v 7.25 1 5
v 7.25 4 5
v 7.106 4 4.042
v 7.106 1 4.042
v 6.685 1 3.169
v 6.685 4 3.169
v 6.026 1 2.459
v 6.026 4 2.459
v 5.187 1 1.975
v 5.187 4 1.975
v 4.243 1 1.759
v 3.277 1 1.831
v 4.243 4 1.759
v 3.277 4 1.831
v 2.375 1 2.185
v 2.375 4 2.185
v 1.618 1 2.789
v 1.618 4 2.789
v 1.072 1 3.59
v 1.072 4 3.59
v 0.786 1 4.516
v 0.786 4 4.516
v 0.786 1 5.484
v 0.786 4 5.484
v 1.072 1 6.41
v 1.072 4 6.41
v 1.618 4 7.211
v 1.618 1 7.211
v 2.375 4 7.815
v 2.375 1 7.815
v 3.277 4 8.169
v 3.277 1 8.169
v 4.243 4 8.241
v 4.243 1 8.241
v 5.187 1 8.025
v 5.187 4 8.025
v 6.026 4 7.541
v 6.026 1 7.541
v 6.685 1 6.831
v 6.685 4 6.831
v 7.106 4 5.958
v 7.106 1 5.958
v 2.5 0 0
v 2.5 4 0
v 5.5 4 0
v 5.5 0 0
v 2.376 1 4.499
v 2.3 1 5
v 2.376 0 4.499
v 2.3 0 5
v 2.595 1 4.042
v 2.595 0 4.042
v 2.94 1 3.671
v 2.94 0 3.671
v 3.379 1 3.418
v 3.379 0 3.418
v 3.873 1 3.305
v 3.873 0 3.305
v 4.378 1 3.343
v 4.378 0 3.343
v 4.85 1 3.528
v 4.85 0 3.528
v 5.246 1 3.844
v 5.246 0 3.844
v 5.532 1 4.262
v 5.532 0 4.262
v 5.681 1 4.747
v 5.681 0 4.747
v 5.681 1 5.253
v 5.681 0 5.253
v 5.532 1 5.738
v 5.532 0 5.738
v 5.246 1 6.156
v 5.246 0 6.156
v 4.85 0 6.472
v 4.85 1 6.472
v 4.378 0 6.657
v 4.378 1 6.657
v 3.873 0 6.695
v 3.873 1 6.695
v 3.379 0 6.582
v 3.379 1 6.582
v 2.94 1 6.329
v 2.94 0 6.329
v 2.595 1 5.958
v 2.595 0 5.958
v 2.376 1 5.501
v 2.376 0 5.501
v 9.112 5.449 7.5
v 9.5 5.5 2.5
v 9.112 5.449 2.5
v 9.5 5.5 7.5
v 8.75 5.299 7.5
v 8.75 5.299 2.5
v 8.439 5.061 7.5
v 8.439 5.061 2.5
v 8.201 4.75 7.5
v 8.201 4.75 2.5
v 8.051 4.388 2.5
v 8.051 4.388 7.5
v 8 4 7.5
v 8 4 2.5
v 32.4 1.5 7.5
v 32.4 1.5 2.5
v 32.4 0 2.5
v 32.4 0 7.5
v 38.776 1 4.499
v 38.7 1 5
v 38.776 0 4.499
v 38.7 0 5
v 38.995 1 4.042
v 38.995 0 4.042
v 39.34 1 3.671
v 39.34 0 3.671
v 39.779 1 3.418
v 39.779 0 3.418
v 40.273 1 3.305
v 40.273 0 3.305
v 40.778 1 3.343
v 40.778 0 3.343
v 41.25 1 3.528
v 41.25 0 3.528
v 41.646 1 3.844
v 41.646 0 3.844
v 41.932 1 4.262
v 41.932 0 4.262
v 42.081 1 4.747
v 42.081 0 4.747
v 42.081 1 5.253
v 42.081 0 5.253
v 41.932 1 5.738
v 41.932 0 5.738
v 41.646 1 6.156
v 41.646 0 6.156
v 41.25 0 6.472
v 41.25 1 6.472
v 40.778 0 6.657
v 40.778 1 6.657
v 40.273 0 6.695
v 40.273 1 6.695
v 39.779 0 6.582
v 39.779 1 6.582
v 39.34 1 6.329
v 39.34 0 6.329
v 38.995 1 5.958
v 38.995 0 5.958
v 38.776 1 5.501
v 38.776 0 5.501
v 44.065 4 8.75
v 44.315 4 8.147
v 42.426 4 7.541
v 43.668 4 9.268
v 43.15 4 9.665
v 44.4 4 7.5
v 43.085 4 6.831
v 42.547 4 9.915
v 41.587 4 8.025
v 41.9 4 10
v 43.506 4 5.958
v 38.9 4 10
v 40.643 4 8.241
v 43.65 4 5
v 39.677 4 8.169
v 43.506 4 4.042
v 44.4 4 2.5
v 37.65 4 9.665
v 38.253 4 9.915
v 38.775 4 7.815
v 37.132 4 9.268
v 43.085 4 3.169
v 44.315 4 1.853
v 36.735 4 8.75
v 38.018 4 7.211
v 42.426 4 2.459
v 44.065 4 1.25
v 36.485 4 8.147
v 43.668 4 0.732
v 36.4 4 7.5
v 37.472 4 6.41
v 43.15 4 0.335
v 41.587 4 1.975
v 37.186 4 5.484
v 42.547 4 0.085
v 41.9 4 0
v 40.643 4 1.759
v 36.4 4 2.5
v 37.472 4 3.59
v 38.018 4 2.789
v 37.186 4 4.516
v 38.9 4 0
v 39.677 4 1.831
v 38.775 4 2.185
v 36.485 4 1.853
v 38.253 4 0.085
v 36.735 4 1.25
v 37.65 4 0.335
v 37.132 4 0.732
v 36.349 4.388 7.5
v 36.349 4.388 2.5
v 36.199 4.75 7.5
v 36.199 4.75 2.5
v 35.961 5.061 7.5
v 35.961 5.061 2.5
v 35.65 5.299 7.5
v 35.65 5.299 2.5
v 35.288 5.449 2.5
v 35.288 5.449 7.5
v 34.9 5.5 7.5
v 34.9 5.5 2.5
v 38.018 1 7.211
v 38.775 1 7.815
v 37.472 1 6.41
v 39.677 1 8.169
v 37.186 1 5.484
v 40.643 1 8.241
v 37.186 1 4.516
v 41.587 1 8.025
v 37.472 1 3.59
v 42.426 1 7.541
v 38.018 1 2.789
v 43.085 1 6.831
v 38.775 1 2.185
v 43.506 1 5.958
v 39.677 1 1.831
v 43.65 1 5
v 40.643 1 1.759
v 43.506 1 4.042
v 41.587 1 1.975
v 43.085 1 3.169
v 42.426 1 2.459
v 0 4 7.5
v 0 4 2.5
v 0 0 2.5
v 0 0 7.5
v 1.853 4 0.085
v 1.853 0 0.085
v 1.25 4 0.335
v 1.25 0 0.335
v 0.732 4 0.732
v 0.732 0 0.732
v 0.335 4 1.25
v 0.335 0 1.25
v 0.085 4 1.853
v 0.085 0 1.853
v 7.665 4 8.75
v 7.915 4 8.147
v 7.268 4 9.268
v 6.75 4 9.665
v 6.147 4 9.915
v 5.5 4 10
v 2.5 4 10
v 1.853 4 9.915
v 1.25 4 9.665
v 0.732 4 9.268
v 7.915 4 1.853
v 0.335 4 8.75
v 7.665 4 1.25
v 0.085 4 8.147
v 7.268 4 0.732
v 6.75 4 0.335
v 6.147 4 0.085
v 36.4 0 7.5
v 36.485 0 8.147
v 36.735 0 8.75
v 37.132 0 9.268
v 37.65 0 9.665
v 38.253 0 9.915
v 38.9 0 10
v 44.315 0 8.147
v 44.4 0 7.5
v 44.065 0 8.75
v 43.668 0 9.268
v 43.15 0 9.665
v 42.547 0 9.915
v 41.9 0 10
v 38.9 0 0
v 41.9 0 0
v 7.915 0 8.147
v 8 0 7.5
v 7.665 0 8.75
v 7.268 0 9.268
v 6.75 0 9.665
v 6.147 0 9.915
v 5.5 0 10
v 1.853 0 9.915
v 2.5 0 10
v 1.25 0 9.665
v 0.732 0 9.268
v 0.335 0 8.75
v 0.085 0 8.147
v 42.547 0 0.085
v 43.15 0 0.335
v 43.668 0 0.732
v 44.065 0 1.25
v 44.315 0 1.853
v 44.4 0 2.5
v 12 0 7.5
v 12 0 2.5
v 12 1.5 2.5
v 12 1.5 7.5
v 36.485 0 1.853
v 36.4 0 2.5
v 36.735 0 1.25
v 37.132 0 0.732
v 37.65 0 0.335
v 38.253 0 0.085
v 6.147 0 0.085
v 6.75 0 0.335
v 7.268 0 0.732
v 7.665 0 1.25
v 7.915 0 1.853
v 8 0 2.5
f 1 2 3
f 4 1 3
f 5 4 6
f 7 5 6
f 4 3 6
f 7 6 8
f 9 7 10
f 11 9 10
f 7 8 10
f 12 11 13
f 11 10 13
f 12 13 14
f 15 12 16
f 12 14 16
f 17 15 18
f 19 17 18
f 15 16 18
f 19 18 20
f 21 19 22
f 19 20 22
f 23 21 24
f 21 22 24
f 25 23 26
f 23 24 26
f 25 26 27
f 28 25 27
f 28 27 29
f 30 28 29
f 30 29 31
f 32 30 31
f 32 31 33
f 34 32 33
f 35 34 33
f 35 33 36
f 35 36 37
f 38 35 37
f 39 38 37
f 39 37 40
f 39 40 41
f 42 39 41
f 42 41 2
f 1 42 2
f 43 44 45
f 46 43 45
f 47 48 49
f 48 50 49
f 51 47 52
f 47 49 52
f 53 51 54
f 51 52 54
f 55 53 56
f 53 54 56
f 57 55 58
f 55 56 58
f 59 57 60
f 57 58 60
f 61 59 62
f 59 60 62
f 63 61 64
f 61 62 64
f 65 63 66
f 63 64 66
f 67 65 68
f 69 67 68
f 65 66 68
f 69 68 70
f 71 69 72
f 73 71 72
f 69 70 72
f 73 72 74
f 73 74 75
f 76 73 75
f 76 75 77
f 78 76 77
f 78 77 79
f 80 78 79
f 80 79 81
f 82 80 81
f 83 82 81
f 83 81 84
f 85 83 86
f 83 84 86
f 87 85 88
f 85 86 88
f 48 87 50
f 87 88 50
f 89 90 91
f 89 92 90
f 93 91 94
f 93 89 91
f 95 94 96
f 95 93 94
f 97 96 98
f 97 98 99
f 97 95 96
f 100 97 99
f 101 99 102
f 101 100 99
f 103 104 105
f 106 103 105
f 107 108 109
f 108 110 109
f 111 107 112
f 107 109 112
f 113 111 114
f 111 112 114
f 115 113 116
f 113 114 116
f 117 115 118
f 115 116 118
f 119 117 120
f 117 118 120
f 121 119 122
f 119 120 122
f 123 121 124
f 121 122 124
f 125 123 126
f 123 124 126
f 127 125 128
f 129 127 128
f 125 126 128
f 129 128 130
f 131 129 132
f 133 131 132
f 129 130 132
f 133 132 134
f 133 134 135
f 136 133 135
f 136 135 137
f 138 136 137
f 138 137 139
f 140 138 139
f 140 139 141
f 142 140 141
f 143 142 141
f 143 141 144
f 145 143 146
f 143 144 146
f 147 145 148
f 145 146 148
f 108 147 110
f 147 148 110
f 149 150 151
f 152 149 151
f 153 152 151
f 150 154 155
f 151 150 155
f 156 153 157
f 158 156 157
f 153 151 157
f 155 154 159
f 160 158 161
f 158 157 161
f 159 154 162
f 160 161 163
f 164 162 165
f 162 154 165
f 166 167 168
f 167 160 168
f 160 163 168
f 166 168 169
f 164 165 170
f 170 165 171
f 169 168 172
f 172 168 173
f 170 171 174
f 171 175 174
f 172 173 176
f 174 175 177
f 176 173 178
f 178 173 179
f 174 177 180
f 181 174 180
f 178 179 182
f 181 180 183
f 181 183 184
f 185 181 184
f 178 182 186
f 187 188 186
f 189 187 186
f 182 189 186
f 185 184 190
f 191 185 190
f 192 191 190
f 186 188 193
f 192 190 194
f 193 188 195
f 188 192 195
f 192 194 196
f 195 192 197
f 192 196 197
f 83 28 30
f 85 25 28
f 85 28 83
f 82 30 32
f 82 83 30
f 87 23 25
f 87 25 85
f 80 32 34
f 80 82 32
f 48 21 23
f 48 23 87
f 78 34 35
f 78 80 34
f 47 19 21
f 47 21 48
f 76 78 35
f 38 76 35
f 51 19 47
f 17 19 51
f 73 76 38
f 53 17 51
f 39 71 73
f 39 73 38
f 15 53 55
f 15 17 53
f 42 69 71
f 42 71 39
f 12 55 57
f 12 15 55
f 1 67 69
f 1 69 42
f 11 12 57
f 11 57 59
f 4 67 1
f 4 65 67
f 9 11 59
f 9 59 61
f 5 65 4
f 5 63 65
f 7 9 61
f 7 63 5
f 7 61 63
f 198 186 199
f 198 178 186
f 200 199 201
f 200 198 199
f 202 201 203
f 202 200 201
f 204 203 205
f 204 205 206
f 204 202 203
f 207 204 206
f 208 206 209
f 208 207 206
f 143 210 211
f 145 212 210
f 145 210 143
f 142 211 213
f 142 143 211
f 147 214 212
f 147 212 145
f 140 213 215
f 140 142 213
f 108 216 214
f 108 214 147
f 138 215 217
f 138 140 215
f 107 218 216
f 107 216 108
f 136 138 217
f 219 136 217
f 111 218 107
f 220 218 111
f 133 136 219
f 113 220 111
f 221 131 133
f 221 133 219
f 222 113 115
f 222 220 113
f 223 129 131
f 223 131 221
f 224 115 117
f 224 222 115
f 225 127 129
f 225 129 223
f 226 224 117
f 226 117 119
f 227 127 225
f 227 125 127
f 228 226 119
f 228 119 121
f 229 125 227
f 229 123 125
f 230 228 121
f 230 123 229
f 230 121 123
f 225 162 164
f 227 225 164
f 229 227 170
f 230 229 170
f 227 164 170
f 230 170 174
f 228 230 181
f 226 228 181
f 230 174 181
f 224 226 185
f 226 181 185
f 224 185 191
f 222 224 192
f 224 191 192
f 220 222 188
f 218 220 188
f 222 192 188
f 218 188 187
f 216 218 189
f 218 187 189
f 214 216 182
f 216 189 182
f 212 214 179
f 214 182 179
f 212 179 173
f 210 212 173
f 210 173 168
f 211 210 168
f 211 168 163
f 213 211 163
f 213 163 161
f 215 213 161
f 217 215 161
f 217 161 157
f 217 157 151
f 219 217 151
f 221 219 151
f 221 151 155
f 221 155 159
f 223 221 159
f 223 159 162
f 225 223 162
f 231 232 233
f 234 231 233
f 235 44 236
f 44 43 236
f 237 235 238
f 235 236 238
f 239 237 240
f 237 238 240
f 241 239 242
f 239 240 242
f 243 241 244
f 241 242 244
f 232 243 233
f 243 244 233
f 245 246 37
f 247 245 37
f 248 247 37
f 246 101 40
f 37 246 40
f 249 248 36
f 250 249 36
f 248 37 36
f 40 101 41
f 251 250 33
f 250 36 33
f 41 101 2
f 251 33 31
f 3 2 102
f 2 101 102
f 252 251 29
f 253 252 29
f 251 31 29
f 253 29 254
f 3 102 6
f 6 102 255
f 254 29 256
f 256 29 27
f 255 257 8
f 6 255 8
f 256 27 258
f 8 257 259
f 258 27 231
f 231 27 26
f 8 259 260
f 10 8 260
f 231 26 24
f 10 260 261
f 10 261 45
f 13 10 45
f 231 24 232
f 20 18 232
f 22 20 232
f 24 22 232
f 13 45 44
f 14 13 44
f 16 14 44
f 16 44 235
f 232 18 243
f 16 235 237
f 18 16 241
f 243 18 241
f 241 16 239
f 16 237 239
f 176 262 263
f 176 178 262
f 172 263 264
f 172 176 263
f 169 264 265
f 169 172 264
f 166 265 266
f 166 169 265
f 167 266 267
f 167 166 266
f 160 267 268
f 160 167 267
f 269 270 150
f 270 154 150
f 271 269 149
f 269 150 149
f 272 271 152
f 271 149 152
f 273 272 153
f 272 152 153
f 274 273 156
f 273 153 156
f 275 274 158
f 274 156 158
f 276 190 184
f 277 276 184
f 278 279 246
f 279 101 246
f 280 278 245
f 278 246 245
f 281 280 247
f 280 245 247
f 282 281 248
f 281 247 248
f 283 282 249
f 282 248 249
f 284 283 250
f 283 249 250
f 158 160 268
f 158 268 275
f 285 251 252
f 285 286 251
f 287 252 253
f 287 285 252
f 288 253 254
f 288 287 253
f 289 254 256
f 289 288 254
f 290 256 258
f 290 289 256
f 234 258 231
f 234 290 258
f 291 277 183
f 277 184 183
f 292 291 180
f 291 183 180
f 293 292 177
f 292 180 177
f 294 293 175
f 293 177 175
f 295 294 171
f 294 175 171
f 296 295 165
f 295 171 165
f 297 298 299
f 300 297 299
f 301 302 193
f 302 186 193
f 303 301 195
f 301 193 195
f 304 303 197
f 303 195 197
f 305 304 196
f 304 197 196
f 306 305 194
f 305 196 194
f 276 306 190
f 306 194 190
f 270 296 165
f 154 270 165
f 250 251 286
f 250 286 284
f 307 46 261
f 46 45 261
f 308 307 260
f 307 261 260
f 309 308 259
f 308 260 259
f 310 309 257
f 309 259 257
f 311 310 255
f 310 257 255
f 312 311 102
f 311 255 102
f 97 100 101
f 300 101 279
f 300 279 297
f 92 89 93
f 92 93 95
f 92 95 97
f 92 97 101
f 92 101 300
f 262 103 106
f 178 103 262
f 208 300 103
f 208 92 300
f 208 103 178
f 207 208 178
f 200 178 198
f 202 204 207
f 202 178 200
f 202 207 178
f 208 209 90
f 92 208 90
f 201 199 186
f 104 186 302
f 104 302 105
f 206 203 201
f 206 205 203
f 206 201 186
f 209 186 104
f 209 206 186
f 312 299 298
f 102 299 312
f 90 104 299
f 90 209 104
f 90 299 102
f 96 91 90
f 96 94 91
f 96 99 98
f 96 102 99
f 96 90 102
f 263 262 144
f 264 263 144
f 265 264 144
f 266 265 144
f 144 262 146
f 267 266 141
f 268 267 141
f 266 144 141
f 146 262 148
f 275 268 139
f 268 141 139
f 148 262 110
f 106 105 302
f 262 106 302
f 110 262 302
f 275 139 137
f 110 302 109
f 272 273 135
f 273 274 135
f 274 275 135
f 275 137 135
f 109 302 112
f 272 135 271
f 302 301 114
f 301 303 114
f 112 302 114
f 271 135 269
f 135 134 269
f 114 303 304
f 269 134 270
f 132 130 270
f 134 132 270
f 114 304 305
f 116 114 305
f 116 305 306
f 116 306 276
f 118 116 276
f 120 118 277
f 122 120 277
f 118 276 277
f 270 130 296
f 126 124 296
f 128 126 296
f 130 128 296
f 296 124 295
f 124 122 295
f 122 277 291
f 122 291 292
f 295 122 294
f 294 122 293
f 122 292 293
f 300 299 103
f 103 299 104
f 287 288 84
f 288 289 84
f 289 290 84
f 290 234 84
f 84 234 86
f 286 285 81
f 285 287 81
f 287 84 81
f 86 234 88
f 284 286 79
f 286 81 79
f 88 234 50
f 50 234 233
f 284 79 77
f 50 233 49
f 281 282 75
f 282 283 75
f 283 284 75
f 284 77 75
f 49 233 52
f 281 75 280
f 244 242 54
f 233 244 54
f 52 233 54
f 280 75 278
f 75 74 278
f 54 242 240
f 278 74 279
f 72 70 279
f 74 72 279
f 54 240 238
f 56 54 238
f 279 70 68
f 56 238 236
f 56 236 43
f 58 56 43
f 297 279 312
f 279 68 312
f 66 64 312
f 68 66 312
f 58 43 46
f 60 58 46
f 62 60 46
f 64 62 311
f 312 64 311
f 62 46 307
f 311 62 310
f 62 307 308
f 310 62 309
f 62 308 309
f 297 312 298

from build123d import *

# Parameters (mm, degrees)
RESSALTO_EXTRUS_O1_DEPTH          = 10
REBAIXO_PARA_SHCS_M31_D           = 3.4
REBAIXO_PARA_SHCS_M31_CBORE_D     = 6.5
REBAIXO_PARA_SHCS_M31_CBORE_DEPTH = 3
ESBO_O4_W                         = 28.4
ESBO_O4_H                         = 5.5
CORTE_EXTRUS_O1_DEPTH             = 2.5
ESBO_O5_W                         = 28.4
ESBO_O5_H                         = 5.5
CORTE_EXTRUS_O2_DEPTH             = 2.5
FILETE1_R                         = 2.5
FILETE2_R                         = 1.5


with BuildPart() as part:
    # Esboço1 → Ressalto-extrusão1 (new body)
    with BuildSketch(Plane.XY):
        Polygon((0, 0), (12, 0), (12, 1.5), (32.4, 1.5), (32.4, 0), (44.4, 0), (44.4, 4), (36.4, 4), (36.4, 5.5), (8, 5.5), (8, 4), (0, 4), align=None)
    extrude(amount=RESSALTO_EXTRUS_O1_DEPTH)

    # Rebaixo para SHCS M31 (through all)
    with Locations(Plane(origin=(0, 4, 0), x_dir=(1, 0, 0), z_dir=(0, 1, 0))):
        with Locations((4, -5), (40.4, -5)):
            CounterBoreHole(REBAIXO_PARA_SHCS_M31_D / 2, REBAIXO_PARA_SHCS_M31_CBORE_D / 2, REBAIXO_PARA_SHCS_M31_CBORE_DEPTH)

    # Esboço4 → Corte-extrusão1 (cut)
    with BuildSketch(Plane.XY.offset(10)):
        with Locations((22.2, 2.75)):
            Rectangle(ESBO_O4_W, ESBO_O4_H)
    extrude(amount=-CORTE_EXTRUS_O1_DEPTH, mode=Mode.SUBTRACT)

    # Esboço5 → Corte-extrusão2 (cut)
    with BuildSketch(Plane(origin=(0, 0, 0), x_dir=(-1, 0, 0), z_dir=(0, 0, -1))):
        with Locations((-22.2, 2.75)):
            Rectangle(ESBO_O5_W, ESBO_O5_H)
    extrude(amount=-CORTE_EXTRUS_O2_DEPTH, mode=Mode.SUBTRACT)

    # Filete1
    filete1_edges = [part.edges().sort_by_distance(p)[0] for p in [
        (8, 2, 10),
        (0, 2, 10),
        (0, 2, 0),
        (8, 2, 0),
        (36.4, 2, 10),
        (44.4, 2, 10),
        (44.4, 2, 0),
        (36.4, 2, 0),
    ]]
    fillet(filete1_edges, radius=FILETE1_R - 0.0001)  # a hair under: the kernel refuses the full size

    # Filete2
    filete2_edges = [part.edges().sort_by_distance(p)[0] for p in [
        (36.4, 5.5, 5),
        (8, 5.5, 5),
    ]]
    fillet(filete2_edges, radius=FILETE2_R - 0.0001)  # a hair under: the kernel refuses the full size


solid = part.part
